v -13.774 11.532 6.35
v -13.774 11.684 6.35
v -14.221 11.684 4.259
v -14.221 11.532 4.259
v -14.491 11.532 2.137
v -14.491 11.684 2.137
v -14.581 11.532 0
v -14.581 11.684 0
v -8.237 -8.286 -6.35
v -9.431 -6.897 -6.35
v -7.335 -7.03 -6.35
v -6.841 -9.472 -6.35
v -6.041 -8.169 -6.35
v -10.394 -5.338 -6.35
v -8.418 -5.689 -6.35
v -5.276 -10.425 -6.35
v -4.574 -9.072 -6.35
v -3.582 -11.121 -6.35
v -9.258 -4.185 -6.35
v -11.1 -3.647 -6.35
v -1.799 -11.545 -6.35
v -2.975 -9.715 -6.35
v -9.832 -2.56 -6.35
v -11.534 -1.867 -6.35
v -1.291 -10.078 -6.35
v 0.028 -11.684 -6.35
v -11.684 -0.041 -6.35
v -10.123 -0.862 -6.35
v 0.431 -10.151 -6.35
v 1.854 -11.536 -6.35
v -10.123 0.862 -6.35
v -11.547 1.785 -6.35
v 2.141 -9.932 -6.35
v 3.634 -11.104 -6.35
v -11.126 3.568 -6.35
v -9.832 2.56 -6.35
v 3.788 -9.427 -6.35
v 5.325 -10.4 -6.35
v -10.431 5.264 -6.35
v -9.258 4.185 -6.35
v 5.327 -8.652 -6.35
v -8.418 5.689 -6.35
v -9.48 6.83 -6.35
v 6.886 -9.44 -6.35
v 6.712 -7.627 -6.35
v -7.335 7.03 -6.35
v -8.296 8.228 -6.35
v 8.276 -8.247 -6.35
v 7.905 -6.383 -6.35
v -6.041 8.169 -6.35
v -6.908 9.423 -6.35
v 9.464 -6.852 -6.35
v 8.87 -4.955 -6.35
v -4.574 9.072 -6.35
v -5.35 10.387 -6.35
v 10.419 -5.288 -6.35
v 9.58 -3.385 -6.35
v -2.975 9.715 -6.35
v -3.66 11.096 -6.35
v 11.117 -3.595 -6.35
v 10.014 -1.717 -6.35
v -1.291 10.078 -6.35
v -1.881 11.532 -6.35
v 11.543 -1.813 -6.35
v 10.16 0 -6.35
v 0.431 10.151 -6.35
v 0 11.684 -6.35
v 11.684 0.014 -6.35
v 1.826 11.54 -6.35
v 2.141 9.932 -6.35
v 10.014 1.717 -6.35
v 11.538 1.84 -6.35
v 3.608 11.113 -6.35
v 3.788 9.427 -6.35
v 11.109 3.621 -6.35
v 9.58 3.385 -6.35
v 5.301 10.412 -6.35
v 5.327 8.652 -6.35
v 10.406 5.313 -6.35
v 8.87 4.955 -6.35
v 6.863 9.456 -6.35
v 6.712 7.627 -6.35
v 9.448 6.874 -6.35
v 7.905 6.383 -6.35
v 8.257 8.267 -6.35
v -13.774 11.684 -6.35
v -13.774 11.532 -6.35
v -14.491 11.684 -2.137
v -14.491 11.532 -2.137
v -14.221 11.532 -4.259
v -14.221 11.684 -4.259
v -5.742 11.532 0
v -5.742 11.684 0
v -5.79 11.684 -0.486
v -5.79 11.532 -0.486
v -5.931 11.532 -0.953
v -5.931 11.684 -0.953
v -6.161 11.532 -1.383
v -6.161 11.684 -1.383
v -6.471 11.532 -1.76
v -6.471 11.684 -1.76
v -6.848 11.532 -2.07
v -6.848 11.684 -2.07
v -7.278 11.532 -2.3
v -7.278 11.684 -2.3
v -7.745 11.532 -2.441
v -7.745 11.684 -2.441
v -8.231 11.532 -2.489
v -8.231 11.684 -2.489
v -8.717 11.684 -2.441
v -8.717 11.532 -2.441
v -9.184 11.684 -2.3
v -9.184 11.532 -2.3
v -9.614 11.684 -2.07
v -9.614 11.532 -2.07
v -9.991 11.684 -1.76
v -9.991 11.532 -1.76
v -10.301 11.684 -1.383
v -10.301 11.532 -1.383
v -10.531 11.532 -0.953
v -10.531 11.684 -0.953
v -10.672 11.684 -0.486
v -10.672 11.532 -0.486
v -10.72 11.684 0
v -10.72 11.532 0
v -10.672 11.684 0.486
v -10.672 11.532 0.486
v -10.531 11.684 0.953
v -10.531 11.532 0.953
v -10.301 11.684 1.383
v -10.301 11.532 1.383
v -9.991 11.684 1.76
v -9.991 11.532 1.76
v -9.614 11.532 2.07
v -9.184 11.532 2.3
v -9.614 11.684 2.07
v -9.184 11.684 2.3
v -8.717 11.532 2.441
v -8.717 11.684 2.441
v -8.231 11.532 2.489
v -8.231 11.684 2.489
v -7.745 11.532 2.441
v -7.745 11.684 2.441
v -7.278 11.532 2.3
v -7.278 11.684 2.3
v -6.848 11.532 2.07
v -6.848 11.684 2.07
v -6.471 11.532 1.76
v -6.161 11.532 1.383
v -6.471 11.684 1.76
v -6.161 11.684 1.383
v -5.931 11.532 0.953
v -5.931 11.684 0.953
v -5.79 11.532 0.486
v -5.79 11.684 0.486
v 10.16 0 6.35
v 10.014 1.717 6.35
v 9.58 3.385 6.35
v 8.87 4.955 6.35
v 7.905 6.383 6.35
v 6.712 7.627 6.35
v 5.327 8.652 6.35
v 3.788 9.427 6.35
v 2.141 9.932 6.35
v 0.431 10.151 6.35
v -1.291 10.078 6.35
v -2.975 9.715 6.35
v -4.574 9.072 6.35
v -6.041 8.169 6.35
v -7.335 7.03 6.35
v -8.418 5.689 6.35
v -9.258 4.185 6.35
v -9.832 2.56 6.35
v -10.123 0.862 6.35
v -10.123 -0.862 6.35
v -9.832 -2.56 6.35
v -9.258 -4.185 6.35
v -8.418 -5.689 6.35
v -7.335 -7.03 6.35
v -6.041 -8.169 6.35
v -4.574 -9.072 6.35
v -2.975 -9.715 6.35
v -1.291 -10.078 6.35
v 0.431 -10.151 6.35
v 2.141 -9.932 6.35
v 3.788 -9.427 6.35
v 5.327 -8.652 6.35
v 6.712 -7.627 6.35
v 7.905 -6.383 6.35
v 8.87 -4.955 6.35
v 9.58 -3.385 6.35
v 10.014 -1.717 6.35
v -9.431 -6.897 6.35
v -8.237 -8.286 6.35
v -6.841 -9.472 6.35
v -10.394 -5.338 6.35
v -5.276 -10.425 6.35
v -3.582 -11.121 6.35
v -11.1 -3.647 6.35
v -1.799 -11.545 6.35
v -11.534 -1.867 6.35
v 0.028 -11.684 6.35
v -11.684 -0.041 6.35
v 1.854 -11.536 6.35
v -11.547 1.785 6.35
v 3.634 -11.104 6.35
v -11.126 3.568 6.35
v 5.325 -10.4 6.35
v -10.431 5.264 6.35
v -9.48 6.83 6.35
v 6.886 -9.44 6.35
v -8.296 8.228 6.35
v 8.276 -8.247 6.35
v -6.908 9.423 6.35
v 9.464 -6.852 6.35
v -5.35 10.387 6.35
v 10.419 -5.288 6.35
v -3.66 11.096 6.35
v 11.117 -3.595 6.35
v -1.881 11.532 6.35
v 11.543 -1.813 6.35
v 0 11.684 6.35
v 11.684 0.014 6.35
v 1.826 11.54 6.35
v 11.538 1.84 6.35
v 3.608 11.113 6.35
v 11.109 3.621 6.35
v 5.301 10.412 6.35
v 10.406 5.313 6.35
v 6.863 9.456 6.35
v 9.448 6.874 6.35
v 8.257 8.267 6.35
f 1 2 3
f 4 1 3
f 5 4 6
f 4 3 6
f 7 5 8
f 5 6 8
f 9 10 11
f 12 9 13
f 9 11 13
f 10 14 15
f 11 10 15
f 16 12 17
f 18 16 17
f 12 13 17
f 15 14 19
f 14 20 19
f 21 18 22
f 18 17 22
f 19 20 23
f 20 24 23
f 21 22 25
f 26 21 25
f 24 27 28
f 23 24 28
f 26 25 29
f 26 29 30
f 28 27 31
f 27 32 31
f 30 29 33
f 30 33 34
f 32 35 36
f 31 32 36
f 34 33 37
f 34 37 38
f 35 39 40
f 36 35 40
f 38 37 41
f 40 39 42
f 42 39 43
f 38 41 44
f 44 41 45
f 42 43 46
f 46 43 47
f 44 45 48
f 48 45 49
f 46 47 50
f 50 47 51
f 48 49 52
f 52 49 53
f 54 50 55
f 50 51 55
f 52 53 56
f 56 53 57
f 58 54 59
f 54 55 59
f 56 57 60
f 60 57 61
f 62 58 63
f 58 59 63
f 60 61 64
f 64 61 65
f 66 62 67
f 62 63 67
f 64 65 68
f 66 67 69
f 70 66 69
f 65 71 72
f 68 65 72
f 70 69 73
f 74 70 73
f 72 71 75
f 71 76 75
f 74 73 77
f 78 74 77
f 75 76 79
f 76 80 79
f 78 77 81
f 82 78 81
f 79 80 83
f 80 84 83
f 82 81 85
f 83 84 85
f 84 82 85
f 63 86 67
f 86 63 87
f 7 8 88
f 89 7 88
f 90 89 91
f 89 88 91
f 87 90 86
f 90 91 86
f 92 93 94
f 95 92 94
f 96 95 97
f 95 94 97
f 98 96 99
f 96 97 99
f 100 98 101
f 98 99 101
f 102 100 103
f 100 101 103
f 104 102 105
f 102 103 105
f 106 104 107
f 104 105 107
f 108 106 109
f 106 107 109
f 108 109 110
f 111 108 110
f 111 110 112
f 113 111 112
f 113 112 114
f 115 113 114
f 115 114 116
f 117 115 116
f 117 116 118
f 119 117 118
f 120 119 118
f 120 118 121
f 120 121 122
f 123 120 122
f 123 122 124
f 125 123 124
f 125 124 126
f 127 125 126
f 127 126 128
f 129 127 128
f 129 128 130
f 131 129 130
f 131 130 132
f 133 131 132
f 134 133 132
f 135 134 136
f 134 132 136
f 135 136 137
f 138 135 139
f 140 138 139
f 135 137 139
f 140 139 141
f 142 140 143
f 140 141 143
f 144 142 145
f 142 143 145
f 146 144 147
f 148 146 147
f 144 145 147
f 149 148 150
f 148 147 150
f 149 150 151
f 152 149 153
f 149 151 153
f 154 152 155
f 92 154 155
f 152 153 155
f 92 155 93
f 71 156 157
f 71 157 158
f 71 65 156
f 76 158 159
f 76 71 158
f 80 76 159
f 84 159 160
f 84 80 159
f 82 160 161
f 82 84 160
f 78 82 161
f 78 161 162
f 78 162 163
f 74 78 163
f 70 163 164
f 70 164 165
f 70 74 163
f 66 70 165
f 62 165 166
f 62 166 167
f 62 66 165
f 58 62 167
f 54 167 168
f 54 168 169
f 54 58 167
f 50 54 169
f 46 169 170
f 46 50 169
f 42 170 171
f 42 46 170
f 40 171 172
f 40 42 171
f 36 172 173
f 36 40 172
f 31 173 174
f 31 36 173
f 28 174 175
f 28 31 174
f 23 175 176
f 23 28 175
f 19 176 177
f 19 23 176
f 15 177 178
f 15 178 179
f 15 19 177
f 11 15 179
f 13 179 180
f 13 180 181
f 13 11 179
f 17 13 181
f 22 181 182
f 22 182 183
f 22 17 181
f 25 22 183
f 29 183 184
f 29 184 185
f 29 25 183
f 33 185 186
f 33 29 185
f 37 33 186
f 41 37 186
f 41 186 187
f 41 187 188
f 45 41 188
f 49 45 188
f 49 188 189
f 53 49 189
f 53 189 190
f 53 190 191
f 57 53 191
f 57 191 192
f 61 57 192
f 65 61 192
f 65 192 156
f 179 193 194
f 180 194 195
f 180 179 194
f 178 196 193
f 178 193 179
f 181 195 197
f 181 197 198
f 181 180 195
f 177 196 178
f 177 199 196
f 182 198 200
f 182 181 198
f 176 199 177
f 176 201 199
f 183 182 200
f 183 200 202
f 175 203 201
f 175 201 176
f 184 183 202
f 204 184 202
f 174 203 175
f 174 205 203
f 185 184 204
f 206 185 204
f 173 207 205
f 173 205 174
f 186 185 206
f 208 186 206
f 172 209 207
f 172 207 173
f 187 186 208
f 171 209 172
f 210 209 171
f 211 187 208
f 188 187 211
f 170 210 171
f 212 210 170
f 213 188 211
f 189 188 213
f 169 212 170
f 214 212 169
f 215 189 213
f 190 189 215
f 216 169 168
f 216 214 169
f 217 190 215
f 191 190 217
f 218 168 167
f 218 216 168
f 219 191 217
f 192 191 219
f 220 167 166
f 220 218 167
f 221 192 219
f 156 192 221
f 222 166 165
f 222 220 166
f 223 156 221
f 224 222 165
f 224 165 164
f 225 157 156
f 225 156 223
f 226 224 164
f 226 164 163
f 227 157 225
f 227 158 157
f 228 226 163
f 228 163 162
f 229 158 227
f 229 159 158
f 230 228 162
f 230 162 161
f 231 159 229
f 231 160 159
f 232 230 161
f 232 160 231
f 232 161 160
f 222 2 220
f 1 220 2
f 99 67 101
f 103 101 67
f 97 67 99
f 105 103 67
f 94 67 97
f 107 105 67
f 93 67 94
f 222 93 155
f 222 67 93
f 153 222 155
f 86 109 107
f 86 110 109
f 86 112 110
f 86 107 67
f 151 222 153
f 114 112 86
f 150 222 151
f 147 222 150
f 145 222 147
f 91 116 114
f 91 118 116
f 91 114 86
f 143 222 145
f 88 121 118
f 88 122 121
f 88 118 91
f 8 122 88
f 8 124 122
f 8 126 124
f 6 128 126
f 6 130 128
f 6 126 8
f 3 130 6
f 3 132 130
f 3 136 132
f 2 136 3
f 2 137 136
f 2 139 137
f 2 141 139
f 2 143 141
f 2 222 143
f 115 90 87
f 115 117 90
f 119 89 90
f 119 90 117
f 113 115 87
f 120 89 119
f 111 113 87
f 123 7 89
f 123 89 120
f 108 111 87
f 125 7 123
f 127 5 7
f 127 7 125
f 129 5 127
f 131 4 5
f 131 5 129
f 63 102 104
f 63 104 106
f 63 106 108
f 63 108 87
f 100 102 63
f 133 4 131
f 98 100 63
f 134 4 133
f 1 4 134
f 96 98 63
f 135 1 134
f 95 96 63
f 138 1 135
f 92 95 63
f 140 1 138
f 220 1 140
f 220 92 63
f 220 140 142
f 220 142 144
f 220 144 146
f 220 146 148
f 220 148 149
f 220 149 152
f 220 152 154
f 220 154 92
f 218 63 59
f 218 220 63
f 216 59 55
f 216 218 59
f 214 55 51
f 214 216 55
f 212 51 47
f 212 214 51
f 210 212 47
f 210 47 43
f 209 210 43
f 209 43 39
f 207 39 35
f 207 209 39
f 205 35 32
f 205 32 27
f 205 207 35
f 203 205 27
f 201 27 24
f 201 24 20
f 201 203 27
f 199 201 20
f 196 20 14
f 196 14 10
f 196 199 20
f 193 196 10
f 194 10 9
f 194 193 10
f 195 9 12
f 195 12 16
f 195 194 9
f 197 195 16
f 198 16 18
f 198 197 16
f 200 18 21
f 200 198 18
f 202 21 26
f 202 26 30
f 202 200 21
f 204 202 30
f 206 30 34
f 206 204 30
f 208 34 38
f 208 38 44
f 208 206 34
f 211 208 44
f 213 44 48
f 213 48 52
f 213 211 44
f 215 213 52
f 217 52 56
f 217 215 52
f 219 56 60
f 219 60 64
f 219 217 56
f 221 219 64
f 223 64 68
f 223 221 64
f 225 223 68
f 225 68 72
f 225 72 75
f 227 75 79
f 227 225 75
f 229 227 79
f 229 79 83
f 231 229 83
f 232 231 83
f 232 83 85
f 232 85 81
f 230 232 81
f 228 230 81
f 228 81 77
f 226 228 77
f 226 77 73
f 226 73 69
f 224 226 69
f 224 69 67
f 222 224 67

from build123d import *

# Parameters (mm, degrees)
SKETCH1_R           = 11.684
SKETCH1_R_2         = 10.16
BOSS_EXTRUDE1_DEPTH = 6.35
CUT_EXTRUDE1_REACH  = 25.368
SKETCH5_R           = 2.4892


with BuildPart() as part:
    # Sketch1 → Boss-Extrude1 (new body, symmetric)
    with BuildSketch(Plane.XY):
        Circle(SKETCH1_R)
        Circle(SKETCH1_R_2, mode=Mode.SUBTRACT)
        with BuildLine():
            ThreePointArc((-1.880972472, 11.5316), (-0.943568122, 11.645837677), (0, 11.684))
            Line((0, 11.684), (-14.580972472, 11.684))
            Line((-14.580972472, 11.684), (-14.580972472, 11.5316))
            Line((-14.580972472, 11.5316), (-1.880972472, 11.5316))
        make_face()
    extrude(amount=BOSS_EXTRUDE1_DEPTH, both=True)

    # Sketch5 → Cut-Extrude1 (cut, up to next)
    with BuildSketch(Plane(origin=(0, 11.684, 0), x_dir=(1, 0, 0), z_dir=(0, 1, 0)), mode=Mode.PRIVATE) as cut_extrude1_sk1:
        with BuildLine():
            ThreePointArc((-14.580972472, 0), (-14.378526757, 3.200509029), (-13.77441672, 6.35))
            Line((-13.77441672, 6.35), (-14.580972472, 6.35))
            Line((-14.580972472, 6.35), (-14.580972472, 0))
        make_face()
    cut_extrude1_tool1 = extrude(cut_extrude1_sk1.sketch, amount=-CUT_EXTRUDE1_REACH, mode=Mode.PRIVATE) & part.part
    add(cut_extrude1_tool1.solids().sort_by_distance((-14.339679, 11.684, -4.767585))[0], mode=Mode.SUBTRACT)
    # Sketch5 → Cut-Extrude1 (cut, up to next)
    with BuildSketch(Plane(origin=(0, 11.684, 0), x_dir=(1, 0, 0), z_dir=(0, 1, 0)), mode=Mode.PRIVATE) as cut_extrude1_sk2:
        with BuildLine():
            ThreePointArc((-13.77441672, -6.35), (-14.378526757, -3.200509029), (-14.580972472, 0))
            Line((-14.580972472, 0), (-14.580972472, -6.35))
            Line((-14.580972472, -6.35), (-13.77441672, -6.35))
        make_face()
    cut_extrude1_tool2 = extrude(cut_extrude1_sk2.sketch, amount=-CUT_EXTRUDE1_REACH, mode=Mode.PRIVATE) & part.part
    add(cut_extrude1_tool2.solids().sort_by_distance((-14.339679, 11.684, 4.767585))[0], mode=Mode.SUBTRACT)
    # Sketch5 → Cut-Extrude1 (cut, up to next)
    with BuildSketch(Plane(origin=(0, 11.684, 0), x_dir=(1, 0, 0), z_dir=(0, 1, 0)), mode=Mode.PRIVATE) as cut_extrude1_sk3:
        with Locations((-8.230972472, 0)):
            Circle(SKETCH5_R)
    cut_extrude1_tool3 = extrude(cut_extrude1_sk3.sketch, amount=-CUT_EXTRUDE1_REACH, mode=Mode.PRIVATE) & part.part
    add(cut_extrude1_tool3.solids().sort_by_distance((-8.230972, 11.684, 0))[0], mode=Mode.SUBTRACT)


solid = part.part
